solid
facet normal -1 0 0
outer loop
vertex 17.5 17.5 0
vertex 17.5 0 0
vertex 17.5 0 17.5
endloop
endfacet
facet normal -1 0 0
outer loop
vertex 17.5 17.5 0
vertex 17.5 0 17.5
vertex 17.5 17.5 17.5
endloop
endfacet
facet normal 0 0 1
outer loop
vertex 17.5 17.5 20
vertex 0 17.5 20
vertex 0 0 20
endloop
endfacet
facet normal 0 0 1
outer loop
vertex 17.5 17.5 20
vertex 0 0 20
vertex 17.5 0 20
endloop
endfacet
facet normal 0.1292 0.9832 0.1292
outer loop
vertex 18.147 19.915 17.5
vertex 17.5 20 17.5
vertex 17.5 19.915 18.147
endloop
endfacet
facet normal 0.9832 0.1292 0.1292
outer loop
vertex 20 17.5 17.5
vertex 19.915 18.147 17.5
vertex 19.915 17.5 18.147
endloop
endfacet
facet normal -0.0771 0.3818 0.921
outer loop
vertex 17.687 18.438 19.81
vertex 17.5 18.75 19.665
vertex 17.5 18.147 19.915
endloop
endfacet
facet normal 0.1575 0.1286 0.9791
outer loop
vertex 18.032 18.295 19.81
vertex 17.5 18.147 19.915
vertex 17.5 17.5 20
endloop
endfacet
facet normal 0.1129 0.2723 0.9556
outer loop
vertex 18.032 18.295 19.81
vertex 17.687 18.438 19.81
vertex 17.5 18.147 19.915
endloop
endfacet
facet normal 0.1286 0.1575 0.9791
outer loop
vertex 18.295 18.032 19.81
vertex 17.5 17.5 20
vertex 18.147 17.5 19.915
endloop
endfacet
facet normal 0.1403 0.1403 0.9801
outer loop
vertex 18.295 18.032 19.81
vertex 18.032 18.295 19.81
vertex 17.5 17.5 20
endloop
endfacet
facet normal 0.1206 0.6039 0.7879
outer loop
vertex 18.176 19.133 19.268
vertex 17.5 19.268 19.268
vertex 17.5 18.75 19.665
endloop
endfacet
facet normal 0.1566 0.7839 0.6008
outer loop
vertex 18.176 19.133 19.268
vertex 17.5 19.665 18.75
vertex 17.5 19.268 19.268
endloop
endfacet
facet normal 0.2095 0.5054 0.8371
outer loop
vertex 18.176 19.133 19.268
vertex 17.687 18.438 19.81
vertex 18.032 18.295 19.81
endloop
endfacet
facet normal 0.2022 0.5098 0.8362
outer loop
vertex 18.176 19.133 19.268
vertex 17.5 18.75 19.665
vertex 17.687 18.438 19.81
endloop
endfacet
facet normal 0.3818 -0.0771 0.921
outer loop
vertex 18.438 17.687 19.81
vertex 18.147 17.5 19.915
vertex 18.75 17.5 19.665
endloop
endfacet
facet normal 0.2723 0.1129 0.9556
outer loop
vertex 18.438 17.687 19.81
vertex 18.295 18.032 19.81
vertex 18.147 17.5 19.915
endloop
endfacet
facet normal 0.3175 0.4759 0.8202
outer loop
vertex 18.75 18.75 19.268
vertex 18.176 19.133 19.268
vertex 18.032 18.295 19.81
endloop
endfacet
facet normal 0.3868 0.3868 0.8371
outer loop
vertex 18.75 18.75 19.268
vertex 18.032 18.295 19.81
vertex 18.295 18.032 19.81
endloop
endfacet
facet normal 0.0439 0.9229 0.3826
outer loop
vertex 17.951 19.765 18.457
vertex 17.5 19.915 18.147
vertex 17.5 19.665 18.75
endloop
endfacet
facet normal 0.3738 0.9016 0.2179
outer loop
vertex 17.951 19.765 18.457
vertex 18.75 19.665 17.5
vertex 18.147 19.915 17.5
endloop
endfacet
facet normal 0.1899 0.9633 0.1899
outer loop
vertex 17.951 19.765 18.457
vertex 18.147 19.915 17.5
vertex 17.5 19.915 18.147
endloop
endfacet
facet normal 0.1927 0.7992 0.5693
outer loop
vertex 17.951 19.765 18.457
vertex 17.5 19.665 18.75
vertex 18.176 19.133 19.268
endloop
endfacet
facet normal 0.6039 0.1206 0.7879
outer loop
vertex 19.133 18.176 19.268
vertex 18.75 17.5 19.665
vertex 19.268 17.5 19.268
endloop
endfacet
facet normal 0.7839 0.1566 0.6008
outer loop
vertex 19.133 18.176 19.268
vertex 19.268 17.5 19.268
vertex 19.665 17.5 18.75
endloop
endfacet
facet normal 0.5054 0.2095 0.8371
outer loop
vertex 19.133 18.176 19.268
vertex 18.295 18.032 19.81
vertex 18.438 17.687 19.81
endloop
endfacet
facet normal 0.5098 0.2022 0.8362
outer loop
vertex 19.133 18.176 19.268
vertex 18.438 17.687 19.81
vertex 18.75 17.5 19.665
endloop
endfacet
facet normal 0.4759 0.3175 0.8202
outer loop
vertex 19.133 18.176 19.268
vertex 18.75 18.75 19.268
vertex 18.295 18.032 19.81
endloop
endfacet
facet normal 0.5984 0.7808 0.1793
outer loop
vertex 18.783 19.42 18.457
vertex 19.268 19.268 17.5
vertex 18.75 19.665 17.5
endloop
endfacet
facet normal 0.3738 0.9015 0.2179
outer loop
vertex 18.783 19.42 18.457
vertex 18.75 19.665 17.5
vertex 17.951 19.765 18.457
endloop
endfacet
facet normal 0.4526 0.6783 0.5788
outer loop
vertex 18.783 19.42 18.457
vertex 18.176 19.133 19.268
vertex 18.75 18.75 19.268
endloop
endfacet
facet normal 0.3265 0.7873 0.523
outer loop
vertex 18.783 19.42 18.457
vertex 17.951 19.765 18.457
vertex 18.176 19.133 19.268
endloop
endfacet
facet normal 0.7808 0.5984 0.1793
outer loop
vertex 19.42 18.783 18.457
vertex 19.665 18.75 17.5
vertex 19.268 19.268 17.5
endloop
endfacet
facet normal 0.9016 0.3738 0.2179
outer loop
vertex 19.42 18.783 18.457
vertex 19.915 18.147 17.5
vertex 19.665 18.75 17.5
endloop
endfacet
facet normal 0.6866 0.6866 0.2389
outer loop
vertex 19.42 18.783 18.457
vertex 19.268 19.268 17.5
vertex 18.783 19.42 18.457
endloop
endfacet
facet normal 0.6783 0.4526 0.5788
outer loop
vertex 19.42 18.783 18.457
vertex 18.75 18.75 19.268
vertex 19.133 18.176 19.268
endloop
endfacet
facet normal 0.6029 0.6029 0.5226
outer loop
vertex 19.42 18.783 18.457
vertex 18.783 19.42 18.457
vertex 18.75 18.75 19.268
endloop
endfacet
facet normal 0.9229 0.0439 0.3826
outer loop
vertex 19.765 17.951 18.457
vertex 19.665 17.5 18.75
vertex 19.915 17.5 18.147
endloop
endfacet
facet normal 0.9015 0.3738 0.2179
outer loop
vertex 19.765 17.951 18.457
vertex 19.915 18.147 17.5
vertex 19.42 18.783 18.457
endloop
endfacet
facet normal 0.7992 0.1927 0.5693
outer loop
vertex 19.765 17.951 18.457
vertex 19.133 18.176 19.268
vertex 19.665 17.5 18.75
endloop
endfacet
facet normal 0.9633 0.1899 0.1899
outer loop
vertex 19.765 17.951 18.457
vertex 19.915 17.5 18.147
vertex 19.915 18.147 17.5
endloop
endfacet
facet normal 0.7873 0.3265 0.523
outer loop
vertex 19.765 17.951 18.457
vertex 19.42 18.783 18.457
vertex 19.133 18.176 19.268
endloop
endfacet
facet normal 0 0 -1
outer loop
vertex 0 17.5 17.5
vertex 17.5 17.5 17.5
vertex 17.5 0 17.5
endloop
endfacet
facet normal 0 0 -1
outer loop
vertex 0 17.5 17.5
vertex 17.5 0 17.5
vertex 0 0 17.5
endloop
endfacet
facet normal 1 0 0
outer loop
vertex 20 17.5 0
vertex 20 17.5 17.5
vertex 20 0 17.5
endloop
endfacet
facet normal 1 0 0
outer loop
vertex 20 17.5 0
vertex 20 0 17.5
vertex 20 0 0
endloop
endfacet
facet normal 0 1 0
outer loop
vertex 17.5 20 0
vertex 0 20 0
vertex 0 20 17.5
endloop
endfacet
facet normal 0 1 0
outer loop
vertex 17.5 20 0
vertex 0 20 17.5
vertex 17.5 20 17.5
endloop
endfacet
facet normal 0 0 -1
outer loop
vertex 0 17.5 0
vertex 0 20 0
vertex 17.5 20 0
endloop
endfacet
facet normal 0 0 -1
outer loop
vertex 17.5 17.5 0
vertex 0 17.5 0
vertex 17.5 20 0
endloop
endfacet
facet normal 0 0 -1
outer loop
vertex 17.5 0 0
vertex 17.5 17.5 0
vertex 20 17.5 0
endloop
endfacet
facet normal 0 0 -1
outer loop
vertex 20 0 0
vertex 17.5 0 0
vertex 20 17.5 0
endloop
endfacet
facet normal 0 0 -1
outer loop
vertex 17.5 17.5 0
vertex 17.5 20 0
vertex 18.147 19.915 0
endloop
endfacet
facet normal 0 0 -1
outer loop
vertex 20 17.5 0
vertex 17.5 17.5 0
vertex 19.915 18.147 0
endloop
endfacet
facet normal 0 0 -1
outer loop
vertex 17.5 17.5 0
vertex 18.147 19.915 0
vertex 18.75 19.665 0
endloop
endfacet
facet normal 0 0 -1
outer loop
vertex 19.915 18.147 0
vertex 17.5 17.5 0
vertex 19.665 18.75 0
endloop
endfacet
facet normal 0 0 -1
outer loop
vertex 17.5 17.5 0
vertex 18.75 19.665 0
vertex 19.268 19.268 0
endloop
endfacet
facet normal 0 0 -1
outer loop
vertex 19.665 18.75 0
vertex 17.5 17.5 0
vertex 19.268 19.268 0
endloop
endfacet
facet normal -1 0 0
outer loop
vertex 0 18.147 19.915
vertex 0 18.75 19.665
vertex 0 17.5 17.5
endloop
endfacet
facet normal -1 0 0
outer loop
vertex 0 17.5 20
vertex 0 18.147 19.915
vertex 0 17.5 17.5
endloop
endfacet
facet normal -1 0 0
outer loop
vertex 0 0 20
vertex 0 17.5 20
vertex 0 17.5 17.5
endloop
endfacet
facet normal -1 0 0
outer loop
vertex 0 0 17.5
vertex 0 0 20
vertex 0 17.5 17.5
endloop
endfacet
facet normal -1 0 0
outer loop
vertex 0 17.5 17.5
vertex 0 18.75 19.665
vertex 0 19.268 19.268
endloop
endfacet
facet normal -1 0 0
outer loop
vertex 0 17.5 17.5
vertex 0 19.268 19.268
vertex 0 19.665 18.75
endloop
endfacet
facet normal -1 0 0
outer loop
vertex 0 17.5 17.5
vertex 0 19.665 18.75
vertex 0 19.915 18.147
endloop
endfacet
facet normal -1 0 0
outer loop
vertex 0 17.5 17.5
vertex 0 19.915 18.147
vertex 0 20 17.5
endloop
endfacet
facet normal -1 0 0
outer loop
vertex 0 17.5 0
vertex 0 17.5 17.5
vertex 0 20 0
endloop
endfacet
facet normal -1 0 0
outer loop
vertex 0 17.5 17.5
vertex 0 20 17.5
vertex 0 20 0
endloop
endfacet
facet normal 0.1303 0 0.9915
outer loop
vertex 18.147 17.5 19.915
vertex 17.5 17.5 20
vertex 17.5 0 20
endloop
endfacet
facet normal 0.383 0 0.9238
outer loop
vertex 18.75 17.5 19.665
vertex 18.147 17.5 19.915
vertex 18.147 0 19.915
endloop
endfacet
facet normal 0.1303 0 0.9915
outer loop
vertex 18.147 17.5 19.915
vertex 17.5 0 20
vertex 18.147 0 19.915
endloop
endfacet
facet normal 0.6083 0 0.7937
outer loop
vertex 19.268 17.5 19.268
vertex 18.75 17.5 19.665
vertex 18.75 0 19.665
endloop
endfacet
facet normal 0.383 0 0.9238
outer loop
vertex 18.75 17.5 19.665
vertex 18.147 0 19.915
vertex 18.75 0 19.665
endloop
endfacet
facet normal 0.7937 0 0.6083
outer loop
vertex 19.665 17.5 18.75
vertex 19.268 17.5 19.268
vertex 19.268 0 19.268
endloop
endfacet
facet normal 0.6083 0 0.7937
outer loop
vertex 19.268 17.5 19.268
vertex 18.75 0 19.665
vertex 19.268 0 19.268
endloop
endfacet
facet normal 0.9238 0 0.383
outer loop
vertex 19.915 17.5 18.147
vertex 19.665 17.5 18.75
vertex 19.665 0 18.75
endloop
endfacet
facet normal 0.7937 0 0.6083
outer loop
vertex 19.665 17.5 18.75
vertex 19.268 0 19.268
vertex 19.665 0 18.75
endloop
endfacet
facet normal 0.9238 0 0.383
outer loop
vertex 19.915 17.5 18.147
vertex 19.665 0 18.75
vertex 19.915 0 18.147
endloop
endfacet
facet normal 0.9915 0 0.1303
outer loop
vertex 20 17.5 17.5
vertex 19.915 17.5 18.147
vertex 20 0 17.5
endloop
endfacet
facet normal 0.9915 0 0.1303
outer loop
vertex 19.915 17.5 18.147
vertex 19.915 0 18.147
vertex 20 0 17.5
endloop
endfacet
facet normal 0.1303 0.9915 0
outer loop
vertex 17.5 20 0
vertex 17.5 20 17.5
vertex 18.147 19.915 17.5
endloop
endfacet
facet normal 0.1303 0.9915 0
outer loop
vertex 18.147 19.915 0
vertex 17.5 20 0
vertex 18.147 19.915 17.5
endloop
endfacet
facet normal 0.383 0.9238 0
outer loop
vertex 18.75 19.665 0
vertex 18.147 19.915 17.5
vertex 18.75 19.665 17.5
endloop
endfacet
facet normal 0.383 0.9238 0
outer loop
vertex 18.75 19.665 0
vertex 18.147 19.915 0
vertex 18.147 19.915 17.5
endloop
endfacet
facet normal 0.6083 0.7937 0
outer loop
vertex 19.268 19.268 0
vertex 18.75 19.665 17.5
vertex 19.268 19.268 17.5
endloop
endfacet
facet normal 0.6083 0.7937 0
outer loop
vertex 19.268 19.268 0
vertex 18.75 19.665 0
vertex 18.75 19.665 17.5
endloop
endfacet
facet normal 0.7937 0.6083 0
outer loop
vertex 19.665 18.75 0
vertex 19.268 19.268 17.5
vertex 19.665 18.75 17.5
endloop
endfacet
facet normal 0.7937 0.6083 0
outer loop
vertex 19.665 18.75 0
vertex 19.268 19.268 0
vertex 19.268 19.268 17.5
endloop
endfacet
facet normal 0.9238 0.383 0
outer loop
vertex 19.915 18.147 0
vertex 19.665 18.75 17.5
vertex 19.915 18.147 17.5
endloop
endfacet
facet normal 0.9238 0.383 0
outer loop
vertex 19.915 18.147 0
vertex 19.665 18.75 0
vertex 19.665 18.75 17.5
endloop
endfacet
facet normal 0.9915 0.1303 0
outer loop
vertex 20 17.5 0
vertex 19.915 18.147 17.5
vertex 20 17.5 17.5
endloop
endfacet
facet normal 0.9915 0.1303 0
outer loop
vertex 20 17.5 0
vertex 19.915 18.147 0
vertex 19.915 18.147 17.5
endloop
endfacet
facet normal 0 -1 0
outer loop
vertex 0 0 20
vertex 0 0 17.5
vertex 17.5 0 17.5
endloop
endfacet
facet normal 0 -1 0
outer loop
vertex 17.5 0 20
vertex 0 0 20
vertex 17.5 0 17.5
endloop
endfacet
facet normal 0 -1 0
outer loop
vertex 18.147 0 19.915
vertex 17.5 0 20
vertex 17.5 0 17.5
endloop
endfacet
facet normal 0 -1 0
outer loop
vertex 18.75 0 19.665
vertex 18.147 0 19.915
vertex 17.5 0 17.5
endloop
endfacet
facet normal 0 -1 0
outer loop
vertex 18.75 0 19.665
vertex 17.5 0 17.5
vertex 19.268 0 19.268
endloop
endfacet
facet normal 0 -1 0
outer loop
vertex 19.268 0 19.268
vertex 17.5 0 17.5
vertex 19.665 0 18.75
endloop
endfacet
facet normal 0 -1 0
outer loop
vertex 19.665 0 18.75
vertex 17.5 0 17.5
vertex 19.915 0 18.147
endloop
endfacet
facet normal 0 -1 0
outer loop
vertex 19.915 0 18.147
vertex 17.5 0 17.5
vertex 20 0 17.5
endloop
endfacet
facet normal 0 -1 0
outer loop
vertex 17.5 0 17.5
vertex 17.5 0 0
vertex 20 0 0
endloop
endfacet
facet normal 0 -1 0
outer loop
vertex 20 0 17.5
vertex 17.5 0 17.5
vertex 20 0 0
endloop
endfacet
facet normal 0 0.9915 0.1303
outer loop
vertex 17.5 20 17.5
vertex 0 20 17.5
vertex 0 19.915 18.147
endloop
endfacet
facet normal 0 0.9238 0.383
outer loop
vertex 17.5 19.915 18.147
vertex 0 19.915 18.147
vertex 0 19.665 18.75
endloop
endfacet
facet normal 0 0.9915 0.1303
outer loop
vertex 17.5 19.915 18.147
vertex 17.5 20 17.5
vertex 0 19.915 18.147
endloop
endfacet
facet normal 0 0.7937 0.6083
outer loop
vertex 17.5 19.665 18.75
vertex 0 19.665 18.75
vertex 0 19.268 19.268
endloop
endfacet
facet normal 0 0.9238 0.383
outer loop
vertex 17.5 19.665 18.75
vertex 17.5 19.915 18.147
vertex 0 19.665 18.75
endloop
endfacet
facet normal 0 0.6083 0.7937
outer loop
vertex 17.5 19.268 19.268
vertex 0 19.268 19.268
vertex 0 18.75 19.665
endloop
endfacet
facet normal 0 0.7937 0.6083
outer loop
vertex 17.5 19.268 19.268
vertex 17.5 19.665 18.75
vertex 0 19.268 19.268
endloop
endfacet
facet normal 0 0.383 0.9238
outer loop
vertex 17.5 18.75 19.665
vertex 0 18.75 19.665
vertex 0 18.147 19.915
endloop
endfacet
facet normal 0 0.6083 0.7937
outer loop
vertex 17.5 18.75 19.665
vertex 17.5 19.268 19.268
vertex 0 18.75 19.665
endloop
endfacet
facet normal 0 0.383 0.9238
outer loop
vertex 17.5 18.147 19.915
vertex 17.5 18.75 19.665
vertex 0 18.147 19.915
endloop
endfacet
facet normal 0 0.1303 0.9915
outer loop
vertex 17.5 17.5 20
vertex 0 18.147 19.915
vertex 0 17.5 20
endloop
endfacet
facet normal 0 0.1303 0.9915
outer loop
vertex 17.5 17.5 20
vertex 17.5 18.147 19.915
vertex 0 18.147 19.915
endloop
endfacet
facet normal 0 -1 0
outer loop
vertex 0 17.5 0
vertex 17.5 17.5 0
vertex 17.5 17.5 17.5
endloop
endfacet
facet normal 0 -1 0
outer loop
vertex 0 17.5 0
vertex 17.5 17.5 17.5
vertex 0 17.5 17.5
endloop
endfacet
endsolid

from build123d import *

# Parameters (mm, degrees)
SKETCH1_W           = 20
SKETCH1_H           = 20
BOSS_EXTRUDE1_DEPTH = 20
SKETCH2_W           = 17.5
SKETCH2_H           = 17.5
CUT_EXTRUDE1_DEPTH  = 17.5
FILLET1_R           = 2.5


with BuildPart() as part:
    # Sketch1 → Boss-Extrude1 (new body)
    with BuildSketch(Plane(origin=(0, 20, 0), x_dir=(1, 0, 0), z_dir=(0, 1, 0))):
        with Locations((10, -10)):
            Rectangle(SKETCH1_W, SKETCH1_H)
    extrude(amount=-BOSS_EXTRUDE1_DEPTH)

    # Sketch2 → Cut-Extrude1 (cut)
    with BuildSketch(Plane(origin=(0, 0, 0), x_dir=(-1, 0, 0), z_dir=(0, 0, -1))):
        with Locations((-8.75, 8.75)):
            Rectangle(SKETCH2_W, SKETCH2_H)
    extrude(amount=-CUT_EXTRUDE1_DEPTH, mode=Mode.SUBTRACT)

    # Fillet1
    fillet1_edges = [part.edges().sort_by_distance(p)[0] for p in [
        (20, 20, 10),
        (10, 20, 20),
        (20, 10, 20),
    ]]
    fillet(fillet1_edges, radius=FILLET1_R)


solid = part.part
